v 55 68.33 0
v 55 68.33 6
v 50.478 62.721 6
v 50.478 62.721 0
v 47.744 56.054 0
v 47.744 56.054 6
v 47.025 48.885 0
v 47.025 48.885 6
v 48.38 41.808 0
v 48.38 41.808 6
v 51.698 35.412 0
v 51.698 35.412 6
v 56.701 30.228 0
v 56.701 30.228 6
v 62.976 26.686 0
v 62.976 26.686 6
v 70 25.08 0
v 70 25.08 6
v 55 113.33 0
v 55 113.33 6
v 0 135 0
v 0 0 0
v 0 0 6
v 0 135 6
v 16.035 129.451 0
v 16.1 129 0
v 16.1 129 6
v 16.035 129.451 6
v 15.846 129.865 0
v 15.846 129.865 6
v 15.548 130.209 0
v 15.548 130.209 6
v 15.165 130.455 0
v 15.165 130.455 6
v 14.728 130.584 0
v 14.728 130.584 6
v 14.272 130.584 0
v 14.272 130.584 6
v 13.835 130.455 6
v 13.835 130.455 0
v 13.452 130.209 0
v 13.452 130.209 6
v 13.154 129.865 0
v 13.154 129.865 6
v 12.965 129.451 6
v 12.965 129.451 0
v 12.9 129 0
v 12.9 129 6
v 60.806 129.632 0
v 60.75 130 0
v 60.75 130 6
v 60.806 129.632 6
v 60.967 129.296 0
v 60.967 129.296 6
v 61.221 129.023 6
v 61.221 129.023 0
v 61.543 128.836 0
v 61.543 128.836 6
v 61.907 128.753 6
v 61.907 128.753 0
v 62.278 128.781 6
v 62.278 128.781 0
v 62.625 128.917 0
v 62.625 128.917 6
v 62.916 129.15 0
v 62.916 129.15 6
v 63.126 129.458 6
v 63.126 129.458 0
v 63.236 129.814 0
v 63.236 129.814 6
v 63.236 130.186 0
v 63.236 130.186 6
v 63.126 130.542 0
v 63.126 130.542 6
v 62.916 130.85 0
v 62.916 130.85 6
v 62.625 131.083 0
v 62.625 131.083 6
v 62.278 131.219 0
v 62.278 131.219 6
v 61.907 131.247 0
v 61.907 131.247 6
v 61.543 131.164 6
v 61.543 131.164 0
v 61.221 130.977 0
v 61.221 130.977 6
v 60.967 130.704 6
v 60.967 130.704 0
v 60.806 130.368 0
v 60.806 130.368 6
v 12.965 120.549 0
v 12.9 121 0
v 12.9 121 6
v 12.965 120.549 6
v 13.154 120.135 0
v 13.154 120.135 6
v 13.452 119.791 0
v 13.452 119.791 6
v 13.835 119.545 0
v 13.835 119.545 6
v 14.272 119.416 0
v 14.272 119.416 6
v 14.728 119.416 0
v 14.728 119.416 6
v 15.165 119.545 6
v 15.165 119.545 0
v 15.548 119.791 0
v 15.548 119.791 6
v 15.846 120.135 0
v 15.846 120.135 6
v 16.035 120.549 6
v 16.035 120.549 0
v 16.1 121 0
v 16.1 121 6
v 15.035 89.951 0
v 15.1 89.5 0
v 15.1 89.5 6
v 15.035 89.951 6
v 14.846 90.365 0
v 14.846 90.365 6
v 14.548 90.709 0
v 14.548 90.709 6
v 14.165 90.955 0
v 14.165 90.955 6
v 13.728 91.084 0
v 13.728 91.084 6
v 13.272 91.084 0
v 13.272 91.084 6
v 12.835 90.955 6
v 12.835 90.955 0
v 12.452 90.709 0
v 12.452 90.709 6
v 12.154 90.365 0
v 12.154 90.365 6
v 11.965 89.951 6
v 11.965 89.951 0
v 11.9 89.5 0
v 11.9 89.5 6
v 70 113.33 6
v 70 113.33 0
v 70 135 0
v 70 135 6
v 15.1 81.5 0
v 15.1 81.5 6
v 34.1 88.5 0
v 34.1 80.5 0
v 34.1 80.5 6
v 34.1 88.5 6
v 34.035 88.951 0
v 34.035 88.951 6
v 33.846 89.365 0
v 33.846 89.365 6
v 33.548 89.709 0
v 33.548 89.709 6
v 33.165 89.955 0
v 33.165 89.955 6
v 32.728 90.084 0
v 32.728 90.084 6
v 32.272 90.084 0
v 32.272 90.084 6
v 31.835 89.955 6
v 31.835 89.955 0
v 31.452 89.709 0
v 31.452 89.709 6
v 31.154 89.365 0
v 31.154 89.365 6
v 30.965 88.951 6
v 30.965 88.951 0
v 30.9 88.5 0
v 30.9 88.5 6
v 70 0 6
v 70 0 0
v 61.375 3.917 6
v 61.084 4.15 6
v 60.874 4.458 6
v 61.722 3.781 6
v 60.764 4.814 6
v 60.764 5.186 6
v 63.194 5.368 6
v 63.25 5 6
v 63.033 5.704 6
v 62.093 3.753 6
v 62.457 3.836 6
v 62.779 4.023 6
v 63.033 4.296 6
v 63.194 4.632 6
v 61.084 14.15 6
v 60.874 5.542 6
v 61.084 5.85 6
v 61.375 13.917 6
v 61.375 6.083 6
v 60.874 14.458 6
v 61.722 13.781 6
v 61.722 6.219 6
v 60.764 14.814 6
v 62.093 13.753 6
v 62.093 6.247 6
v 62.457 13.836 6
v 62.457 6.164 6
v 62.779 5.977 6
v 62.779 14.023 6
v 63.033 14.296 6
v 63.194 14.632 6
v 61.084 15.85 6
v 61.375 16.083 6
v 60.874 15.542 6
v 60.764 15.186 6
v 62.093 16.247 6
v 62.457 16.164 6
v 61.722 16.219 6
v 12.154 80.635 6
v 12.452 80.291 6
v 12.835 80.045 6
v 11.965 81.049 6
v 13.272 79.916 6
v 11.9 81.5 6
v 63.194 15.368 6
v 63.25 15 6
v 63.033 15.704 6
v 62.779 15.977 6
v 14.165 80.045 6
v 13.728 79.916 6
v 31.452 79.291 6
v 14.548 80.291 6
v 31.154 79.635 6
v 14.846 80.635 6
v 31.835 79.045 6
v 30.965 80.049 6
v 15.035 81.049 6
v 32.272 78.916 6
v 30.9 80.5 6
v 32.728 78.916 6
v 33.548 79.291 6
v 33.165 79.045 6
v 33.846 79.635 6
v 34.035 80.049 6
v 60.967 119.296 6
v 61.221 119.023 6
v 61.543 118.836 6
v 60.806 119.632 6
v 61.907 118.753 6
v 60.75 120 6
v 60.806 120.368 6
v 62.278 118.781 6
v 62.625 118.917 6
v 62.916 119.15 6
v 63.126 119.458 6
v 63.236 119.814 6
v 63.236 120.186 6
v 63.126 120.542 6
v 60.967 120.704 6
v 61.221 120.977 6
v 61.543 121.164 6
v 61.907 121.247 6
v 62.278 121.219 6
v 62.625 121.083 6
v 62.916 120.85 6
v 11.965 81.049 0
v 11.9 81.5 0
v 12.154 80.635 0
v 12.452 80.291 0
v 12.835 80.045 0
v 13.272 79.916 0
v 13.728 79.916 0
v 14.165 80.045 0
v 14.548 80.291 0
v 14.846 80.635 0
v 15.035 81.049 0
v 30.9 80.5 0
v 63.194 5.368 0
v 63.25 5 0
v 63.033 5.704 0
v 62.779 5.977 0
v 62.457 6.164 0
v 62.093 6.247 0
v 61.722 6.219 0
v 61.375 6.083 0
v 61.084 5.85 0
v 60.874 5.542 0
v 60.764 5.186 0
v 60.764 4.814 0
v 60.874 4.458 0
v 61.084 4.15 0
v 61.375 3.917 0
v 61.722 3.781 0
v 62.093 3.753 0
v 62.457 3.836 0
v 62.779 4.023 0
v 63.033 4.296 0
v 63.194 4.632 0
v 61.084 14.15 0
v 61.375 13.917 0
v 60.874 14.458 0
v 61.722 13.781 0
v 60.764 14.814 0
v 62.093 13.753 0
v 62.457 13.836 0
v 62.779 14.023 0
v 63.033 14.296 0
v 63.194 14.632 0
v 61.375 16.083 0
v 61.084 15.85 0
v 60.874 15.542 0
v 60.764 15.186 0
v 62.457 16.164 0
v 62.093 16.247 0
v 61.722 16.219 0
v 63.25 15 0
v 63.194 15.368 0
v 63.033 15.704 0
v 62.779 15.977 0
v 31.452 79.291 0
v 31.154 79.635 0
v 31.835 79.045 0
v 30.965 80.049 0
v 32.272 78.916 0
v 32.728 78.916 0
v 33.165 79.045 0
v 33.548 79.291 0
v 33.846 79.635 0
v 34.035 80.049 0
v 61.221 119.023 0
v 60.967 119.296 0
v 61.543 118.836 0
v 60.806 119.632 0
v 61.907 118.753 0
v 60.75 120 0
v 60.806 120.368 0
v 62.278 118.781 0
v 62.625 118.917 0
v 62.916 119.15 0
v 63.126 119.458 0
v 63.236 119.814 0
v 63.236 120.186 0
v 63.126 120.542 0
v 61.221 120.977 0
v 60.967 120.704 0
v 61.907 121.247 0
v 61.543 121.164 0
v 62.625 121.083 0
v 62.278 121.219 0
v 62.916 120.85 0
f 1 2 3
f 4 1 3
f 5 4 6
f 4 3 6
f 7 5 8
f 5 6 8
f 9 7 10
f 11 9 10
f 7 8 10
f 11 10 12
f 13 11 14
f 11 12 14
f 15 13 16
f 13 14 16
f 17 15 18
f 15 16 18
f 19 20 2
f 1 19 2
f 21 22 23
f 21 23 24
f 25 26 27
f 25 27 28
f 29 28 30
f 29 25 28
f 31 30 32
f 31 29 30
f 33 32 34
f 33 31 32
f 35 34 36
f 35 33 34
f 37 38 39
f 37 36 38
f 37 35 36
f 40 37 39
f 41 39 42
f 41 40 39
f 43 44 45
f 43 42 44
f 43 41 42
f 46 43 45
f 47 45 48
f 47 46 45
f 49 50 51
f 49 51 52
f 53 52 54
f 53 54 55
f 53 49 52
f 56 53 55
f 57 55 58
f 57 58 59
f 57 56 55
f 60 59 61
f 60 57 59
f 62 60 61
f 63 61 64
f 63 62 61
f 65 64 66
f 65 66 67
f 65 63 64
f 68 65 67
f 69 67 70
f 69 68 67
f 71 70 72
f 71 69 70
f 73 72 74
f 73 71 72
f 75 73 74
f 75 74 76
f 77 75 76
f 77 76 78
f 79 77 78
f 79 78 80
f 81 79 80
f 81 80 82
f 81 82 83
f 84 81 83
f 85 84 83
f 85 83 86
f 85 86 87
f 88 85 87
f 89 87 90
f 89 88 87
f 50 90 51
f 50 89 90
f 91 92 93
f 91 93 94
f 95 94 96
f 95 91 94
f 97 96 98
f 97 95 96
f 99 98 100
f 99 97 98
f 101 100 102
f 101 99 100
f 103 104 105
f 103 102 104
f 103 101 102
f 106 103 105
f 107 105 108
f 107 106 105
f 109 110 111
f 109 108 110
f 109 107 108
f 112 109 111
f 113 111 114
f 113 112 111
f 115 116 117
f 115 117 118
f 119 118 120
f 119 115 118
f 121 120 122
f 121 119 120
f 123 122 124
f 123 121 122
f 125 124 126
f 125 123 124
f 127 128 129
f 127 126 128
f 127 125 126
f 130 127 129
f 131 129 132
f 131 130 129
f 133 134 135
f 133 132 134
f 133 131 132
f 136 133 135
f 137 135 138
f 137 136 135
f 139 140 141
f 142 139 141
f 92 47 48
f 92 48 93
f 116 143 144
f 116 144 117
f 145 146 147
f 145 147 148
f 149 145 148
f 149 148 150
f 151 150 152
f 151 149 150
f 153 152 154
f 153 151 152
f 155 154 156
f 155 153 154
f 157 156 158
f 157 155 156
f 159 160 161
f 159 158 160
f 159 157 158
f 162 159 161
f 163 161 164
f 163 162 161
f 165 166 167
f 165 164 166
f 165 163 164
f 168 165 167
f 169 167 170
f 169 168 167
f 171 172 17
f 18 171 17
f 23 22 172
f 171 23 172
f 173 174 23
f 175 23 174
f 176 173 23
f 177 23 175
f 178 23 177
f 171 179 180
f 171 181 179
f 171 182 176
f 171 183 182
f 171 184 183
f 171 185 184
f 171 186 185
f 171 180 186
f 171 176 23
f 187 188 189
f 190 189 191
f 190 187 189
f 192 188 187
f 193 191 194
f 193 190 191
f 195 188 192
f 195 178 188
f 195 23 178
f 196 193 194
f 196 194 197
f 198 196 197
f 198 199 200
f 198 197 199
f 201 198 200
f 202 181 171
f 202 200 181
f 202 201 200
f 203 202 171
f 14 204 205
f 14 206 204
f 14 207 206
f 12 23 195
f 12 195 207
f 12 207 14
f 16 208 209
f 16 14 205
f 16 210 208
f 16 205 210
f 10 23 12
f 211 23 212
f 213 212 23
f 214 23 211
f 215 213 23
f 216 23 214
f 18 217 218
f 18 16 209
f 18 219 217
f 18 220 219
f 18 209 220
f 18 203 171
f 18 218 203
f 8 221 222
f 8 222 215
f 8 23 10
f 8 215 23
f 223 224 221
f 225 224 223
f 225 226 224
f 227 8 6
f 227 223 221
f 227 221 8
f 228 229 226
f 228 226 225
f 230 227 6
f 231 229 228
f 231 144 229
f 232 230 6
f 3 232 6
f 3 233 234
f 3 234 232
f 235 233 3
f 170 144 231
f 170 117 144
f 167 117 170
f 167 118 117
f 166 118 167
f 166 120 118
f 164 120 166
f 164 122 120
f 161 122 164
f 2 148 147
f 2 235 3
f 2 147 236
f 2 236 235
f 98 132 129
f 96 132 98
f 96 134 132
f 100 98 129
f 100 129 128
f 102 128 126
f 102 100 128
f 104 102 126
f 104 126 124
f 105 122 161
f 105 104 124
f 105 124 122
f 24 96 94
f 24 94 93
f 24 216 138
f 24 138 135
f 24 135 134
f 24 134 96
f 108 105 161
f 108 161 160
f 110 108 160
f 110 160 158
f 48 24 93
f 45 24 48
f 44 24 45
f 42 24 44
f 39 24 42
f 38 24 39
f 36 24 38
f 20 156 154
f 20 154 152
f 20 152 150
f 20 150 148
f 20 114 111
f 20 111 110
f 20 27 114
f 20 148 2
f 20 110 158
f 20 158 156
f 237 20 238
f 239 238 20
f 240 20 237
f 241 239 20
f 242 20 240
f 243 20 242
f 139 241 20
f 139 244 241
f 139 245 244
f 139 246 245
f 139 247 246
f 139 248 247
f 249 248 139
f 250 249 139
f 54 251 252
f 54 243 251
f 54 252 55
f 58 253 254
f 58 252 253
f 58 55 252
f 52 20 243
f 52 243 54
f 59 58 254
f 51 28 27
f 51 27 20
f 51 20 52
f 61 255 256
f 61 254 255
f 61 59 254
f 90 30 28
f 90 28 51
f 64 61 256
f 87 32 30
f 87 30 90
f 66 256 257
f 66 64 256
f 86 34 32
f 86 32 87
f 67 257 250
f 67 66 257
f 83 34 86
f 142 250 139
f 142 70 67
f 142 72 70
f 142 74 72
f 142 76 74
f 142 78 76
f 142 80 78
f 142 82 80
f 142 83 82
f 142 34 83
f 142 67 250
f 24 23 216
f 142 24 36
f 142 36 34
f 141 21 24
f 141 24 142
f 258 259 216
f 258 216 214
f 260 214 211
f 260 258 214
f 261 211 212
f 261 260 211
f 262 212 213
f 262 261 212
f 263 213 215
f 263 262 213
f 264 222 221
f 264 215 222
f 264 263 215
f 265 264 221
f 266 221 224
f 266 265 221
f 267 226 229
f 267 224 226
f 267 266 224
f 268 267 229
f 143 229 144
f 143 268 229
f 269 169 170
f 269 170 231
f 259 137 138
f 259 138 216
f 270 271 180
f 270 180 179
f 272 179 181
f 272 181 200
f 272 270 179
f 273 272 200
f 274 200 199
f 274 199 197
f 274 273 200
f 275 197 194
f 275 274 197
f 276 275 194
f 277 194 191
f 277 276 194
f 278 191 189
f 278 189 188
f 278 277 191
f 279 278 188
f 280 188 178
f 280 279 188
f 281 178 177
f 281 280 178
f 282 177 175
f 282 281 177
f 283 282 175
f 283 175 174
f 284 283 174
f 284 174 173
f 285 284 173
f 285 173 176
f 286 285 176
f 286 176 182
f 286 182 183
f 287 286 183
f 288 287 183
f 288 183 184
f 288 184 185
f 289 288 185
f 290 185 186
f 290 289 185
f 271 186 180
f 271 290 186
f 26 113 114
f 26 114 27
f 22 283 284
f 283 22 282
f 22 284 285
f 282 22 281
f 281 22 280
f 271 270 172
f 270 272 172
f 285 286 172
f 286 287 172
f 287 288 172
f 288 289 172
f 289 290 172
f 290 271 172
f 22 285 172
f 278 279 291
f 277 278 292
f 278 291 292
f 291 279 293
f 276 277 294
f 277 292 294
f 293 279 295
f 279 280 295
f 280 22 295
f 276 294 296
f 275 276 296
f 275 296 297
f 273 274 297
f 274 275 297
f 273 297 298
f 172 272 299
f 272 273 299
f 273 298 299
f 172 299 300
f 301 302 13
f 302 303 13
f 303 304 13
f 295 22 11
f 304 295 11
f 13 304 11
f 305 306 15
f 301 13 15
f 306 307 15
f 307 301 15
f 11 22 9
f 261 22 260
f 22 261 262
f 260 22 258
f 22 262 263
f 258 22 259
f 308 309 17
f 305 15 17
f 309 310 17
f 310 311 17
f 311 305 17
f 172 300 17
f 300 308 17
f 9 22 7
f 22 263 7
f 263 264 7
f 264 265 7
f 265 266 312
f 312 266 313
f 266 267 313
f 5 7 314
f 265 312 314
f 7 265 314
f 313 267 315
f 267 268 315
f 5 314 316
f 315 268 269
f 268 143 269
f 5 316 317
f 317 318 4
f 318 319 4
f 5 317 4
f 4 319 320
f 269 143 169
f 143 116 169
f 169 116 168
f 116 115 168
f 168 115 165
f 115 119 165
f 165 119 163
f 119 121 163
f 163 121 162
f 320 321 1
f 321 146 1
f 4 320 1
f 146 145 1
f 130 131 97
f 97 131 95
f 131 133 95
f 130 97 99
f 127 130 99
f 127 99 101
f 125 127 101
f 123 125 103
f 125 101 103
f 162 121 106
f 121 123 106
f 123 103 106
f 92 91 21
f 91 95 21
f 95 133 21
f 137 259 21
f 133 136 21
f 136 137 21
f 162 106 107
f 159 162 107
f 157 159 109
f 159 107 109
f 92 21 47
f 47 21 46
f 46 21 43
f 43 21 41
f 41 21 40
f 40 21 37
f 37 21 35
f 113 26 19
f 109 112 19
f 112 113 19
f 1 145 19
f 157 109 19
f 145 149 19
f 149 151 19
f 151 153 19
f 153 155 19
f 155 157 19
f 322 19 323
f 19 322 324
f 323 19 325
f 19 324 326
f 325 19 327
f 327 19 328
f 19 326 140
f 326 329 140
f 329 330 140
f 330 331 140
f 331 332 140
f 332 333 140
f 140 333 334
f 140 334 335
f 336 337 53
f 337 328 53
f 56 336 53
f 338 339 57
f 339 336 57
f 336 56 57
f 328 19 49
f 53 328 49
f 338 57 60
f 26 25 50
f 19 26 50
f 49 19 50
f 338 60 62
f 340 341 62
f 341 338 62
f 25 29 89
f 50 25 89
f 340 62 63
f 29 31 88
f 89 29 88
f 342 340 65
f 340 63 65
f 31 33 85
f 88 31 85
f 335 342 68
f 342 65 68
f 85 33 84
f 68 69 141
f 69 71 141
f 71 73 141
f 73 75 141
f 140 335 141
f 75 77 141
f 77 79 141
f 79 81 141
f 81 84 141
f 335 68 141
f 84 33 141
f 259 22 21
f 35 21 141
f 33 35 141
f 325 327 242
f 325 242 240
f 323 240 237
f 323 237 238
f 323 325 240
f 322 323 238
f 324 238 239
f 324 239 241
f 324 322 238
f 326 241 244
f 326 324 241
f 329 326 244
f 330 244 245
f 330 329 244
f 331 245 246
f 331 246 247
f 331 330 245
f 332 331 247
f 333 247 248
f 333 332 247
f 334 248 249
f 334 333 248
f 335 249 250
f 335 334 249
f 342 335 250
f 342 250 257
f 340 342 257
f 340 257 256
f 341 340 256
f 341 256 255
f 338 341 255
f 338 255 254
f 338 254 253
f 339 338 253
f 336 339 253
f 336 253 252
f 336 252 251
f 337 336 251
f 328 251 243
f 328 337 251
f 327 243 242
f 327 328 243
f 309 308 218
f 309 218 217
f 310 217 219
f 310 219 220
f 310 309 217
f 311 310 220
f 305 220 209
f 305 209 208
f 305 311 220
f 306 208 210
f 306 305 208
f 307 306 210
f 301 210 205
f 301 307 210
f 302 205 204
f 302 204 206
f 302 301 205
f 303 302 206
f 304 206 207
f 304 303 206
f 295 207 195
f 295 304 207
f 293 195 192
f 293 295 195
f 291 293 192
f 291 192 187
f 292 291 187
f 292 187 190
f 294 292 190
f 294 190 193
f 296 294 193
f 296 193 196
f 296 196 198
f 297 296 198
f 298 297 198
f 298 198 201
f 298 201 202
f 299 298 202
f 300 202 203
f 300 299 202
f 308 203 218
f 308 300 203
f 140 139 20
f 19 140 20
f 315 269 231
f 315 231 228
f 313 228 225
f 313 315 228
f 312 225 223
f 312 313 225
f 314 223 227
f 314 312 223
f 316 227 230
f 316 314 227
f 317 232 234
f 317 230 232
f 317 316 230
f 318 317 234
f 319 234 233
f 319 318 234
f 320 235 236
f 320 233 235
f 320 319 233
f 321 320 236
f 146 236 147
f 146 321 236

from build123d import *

# Parameters (mm, degrees)
ESQUISSE1_W             = 70
ESQUISSE1_H             = 135
ESQUISSE1_R             = 1.25
BOSS_EXTRU_1_DEPTH      = 6
ENL_V_MAT_EXTRU_2_DEPTH = 153.187384497
ENL_V_MAT_EXTRU_3_DEPTH = 153.187384497


with BuildPart() as part:
    # Esquisse1 → Boss.-Extru.1 (new body)
    with BuildSketch(Plane.XY):
        with Locations((35, 67.5)):
            Rectangle(ESQUISSE1_W, ESQUISSE1_H)
        with Locations((62, 5)):
            Circle(ESQUISSE1_R, mode=Mode.SUBTRACT)
        with Locations((62, 15)):
            Circle(ESQUISSE1_R, mode=Mode.SUBTRACT)
        with Locations(Location((62, 120, 0), (0, 0, 180))):
            Circle(ESQUISSE1_R, mode=Mode.SUBTRACT)
        with Locations(Location((62, 130, 0), (0, 0, 180))):
            Circle(ESQUISSE1_R, mode=Mode.SUBTRACT)
    extrude(amount=BOSS_EXTRU_1_DEPTH)

    # Esquisse3 → Enlèv. mat.-Extru.2 (cut, through all)
    with BuildSketch(Plane.XY.offset(6)):
        with BuildLine():
            Line((70, 25.080128411), (70, 113.33030278))
            Line((70, 113.33030278), (55, 113.33030278))
            Line((55, 113.33030278), (55, 68.33030278))
            ThreePointArc((55, 68.33030278), (48.380211776, 41.80819896), (70, 25.080128411))
        make_face()
    extrude(amount=-ENL_V_MAT_EXTRU_2_DEPTH, mode=Mode.SUBTRACT)

    # Esquisse4 → Enlèv. mat.-Extru.3 (cut, through all)
    with BuildSketch(Plane(origin=(0, 0, 0), x_dir=(-1, 0, 0), z_dir=(0, 0, -1))):
        with BuildLine():
            Line((-12.9, 129), (-12.9, 121))
            ThreePointArc((-12.9, 121), (-14.5, 119.4), (-16.1, 121))
            Line((-16.1, 121), (-16.1, 129))
            ThreePointArc((-16.1, 129), (-14.5, 130.6), (-12.9, 129))
        make_face()
        with BuildLine():
            Line((-11.9, 89.5), (-11.9, 81.5))
            ThreePointArc((-11.9, 81.5), (-13.5, 79.9), (-15.1, 81.5))
            Line((-15.1, 81.5), (-15.1, 89.5))
            ThreePointArc((-15.1, 89.5), (-13.5, 91.1), (-11.9, 89.5))
        make_face()
        with BuildLine():
            Line((-30.9, 88.5), (-30.9, 80.5))
            ThreePointArc((-30.9, 80.5), (-32.5, 78.9), (-34.1, 80.5))
            Line((-34.1, 80.5), (-34.1, 88.5))
            ThreePointArc((-34.1, 88.5), (-32.5, 90.1), (-30.9, 88.5))
        make_face()
    extrude(amount=-ENL_V_MAT_EXTRU_3_DEPTH, mode=Mode.SUBTRACT)


solid = part.part
